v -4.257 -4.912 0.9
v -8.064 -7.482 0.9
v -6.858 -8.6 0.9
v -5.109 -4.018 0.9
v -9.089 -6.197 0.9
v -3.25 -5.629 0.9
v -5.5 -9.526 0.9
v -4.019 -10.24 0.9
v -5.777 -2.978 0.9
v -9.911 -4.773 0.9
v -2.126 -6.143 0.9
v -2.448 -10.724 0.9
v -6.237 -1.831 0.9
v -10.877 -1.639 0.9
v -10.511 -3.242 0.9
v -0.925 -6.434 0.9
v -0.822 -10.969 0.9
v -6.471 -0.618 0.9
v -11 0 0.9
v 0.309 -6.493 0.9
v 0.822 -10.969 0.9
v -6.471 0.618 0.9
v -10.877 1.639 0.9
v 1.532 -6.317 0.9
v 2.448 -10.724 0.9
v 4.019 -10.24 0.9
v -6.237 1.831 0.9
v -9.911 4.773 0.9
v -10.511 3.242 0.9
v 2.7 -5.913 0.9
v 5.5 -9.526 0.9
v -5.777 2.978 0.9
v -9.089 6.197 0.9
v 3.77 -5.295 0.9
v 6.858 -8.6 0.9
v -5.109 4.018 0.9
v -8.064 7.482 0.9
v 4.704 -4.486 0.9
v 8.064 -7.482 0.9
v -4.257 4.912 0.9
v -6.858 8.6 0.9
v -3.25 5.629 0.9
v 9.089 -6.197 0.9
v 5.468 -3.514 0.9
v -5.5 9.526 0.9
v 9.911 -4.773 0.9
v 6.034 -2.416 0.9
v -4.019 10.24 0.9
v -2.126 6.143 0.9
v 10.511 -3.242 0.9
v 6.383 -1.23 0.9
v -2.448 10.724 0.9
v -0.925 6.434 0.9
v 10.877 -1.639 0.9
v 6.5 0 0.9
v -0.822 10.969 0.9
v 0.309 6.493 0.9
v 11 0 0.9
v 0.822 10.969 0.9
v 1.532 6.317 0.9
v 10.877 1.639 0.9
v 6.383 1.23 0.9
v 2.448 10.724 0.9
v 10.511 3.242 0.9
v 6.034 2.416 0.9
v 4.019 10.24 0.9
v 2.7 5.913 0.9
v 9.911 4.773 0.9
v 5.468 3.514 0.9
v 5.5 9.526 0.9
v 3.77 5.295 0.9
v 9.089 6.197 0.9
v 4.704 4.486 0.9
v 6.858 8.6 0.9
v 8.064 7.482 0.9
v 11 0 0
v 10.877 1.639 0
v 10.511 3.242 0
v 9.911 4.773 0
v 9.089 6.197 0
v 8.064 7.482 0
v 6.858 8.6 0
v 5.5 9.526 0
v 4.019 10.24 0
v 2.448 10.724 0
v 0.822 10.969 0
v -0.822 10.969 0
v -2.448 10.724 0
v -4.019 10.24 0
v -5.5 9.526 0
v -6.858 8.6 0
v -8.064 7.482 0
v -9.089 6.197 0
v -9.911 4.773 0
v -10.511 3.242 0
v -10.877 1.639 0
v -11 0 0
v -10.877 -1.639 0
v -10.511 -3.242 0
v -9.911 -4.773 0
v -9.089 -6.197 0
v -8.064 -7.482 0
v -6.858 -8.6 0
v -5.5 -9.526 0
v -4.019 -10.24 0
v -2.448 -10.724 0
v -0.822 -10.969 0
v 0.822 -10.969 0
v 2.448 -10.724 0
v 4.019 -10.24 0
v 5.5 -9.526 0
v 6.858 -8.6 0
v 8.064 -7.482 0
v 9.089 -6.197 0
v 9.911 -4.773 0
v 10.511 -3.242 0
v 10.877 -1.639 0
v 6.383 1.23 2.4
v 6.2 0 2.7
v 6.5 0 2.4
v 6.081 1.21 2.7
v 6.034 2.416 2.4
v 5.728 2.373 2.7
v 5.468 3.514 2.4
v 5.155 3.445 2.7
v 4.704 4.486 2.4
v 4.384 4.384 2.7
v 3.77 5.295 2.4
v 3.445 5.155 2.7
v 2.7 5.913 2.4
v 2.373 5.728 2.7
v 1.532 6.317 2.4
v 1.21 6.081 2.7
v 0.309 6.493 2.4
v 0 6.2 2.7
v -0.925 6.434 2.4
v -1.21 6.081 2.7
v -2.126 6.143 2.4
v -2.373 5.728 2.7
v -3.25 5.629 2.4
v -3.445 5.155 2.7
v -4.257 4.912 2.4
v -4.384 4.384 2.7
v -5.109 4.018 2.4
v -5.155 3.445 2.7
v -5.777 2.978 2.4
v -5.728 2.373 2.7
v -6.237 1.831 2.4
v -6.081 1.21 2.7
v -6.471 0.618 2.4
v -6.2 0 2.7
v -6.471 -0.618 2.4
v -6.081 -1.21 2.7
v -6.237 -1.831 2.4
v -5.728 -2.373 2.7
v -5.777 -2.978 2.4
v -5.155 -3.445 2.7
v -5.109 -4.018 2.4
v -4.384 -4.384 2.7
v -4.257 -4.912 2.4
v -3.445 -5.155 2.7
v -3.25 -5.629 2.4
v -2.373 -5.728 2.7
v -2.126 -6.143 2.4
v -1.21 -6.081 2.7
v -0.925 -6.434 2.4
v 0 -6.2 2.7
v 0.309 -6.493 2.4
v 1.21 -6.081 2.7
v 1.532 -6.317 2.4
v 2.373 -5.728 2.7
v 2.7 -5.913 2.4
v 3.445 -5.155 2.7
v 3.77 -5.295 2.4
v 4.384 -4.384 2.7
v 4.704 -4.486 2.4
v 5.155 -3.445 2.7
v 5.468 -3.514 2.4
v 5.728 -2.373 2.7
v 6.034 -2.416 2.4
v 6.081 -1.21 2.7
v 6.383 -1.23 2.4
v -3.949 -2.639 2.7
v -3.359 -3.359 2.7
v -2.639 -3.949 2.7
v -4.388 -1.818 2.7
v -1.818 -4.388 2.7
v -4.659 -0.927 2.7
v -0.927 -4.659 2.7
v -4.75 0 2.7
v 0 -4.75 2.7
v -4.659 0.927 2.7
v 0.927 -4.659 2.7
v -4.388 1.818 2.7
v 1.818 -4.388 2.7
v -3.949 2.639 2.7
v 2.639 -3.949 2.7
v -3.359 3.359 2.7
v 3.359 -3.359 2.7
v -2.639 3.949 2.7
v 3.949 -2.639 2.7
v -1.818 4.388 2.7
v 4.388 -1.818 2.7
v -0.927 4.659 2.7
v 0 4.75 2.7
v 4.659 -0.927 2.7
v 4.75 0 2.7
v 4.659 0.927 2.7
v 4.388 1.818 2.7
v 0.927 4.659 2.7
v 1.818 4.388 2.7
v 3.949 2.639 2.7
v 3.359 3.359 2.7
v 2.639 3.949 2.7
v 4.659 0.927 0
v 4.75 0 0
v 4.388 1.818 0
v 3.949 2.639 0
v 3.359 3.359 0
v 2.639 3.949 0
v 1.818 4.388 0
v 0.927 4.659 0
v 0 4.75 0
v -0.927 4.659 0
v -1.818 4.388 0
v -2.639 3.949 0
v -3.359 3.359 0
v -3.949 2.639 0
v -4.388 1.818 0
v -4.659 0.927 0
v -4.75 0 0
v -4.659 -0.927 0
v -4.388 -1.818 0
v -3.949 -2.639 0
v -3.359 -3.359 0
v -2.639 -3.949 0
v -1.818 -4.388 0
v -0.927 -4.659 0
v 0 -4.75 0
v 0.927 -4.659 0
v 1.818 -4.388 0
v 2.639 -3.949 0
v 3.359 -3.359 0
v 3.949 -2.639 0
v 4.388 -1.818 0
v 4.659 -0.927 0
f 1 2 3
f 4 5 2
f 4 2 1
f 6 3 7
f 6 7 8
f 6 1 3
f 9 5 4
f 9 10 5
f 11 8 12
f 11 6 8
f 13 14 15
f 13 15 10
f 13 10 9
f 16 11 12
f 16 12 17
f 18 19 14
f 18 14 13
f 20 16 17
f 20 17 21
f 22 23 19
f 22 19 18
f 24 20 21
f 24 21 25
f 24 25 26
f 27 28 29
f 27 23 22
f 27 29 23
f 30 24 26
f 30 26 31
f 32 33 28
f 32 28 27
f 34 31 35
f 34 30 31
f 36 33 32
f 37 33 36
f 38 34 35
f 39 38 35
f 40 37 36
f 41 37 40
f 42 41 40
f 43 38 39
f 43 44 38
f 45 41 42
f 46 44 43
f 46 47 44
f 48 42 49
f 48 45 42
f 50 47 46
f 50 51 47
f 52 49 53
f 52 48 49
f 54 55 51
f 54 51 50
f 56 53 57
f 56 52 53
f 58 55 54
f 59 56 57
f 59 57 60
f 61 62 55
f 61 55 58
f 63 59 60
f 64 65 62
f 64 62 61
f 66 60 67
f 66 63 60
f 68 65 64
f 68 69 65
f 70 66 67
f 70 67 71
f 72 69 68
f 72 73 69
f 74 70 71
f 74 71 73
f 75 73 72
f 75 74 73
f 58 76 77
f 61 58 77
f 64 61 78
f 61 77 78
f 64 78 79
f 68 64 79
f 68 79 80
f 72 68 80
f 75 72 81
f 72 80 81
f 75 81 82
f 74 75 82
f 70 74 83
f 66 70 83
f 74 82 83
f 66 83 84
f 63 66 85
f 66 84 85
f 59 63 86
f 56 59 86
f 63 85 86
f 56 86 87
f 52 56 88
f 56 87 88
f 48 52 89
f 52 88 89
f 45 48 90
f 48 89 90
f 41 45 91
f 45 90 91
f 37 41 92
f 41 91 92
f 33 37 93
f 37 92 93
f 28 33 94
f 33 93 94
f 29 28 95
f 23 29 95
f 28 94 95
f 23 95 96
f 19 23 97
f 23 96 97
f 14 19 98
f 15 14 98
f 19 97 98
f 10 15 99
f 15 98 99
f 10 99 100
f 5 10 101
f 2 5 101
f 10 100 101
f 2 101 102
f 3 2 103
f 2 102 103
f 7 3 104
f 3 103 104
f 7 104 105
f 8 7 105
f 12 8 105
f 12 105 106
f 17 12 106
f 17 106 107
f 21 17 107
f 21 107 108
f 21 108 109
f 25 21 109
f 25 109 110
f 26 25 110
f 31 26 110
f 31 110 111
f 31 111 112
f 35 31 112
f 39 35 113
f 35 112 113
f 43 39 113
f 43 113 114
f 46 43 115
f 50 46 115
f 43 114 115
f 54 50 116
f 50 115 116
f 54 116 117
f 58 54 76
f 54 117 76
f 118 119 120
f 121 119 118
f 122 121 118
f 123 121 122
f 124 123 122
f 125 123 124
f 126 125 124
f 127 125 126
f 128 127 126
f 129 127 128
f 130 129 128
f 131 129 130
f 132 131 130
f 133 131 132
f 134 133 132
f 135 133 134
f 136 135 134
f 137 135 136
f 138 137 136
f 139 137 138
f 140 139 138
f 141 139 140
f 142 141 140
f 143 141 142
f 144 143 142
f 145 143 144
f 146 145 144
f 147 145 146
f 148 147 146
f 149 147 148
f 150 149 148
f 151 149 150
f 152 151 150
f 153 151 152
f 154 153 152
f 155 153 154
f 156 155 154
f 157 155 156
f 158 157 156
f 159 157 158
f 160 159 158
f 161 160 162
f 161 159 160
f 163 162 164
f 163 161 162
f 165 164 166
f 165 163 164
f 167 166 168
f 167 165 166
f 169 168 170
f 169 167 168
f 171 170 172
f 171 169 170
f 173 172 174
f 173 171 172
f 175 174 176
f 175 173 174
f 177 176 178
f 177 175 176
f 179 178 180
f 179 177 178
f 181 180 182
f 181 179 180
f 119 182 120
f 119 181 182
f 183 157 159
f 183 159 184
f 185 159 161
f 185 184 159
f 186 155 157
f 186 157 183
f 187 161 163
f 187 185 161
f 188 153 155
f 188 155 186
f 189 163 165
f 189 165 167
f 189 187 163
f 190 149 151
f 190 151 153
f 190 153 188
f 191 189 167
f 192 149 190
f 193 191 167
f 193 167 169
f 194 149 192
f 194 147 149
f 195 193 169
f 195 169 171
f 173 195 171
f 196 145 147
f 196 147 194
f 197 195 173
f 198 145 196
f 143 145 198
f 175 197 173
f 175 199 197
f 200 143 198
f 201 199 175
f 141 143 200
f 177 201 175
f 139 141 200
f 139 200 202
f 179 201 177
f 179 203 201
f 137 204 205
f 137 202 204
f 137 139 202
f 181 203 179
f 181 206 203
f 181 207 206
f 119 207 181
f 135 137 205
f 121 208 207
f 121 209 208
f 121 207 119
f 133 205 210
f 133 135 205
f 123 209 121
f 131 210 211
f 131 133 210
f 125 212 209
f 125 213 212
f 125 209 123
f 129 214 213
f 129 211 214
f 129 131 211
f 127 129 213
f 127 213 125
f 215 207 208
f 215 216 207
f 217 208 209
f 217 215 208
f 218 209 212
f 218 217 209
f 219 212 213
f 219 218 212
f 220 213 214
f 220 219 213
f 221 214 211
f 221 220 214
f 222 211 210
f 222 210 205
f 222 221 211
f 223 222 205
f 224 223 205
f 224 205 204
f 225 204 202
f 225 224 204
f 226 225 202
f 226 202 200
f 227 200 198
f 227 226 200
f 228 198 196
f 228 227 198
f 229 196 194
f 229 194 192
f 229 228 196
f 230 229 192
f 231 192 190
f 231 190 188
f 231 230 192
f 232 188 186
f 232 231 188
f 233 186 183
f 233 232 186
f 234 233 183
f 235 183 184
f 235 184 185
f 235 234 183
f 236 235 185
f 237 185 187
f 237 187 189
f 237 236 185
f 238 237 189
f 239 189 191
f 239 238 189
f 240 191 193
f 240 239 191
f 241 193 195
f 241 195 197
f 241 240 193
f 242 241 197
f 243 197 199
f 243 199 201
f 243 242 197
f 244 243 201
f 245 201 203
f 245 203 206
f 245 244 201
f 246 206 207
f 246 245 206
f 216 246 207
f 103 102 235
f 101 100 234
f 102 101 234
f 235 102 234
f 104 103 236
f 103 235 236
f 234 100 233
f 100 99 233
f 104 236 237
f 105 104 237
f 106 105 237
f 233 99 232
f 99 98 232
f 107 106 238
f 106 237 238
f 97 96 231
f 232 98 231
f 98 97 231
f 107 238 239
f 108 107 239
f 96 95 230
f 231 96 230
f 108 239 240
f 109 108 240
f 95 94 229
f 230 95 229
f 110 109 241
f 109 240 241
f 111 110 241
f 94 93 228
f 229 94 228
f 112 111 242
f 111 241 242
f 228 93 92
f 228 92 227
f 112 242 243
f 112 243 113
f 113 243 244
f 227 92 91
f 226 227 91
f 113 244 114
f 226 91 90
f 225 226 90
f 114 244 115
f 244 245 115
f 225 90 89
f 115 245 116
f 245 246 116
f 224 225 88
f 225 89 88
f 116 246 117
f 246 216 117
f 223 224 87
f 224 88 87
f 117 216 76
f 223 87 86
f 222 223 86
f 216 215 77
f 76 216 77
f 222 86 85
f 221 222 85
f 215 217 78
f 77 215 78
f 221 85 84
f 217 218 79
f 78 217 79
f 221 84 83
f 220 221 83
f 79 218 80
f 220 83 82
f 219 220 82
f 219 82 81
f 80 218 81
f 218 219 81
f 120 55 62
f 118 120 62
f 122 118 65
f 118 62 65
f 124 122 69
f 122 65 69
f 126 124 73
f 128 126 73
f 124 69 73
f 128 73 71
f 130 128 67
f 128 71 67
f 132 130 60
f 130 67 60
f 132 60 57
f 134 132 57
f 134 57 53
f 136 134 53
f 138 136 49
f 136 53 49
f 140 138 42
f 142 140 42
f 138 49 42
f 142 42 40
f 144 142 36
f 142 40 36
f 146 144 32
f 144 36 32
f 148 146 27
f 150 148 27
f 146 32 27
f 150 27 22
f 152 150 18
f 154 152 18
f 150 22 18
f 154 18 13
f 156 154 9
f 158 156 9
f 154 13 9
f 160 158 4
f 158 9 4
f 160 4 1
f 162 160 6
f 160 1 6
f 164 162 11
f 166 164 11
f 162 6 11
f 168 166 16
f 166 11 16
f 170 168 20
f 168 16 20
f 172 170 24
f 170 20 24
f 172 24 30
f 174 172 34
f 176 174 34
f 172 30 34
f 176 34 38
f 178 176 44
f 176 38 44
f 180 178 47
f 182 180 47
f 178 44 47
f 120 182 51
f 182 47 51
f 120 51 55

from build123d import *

# Parameters (mm, degrees)
SKETCH_R      = 11
SKETCH_R_2    = 4.75
PAD_DEPTH     = 0.9
SKETCH001_R   = 6.5
SKETCH001_R_2 = 4.75
PAD001_DEPTH  = 1.8
CHAMFER_SIZE  = 0.3


with BuildPart() as part:
    # Sketch → Pad (new body)
    with BuildSketch(Plane.XY):
        Circle(SKETCH_R)
        Circle(SKETCH_R_2, mode=Mode.SUBTRACT)
    extrude(amount=PAD_DEPTH)

    # Sketch001 (on Face4 of Pad) → Pad001 (join)
    with BuildSketch(Plane.XY.offset(0.9)):
        Circle(SKETCH001_R)
        Circle(SKETCH001_R_2, mode=Mode.SUBTRACT)
    extrude(amount=PAD001_DEPTH)

    # Chamfer
    chamfer_edges = [part.edges().sort_by_distance(p)[0] for p in [
        (-6.5, 0, 2.7),
    ]]
    chamfer(chamfer_edges, length=CHAMFER_SIZE)


solid = part.part
